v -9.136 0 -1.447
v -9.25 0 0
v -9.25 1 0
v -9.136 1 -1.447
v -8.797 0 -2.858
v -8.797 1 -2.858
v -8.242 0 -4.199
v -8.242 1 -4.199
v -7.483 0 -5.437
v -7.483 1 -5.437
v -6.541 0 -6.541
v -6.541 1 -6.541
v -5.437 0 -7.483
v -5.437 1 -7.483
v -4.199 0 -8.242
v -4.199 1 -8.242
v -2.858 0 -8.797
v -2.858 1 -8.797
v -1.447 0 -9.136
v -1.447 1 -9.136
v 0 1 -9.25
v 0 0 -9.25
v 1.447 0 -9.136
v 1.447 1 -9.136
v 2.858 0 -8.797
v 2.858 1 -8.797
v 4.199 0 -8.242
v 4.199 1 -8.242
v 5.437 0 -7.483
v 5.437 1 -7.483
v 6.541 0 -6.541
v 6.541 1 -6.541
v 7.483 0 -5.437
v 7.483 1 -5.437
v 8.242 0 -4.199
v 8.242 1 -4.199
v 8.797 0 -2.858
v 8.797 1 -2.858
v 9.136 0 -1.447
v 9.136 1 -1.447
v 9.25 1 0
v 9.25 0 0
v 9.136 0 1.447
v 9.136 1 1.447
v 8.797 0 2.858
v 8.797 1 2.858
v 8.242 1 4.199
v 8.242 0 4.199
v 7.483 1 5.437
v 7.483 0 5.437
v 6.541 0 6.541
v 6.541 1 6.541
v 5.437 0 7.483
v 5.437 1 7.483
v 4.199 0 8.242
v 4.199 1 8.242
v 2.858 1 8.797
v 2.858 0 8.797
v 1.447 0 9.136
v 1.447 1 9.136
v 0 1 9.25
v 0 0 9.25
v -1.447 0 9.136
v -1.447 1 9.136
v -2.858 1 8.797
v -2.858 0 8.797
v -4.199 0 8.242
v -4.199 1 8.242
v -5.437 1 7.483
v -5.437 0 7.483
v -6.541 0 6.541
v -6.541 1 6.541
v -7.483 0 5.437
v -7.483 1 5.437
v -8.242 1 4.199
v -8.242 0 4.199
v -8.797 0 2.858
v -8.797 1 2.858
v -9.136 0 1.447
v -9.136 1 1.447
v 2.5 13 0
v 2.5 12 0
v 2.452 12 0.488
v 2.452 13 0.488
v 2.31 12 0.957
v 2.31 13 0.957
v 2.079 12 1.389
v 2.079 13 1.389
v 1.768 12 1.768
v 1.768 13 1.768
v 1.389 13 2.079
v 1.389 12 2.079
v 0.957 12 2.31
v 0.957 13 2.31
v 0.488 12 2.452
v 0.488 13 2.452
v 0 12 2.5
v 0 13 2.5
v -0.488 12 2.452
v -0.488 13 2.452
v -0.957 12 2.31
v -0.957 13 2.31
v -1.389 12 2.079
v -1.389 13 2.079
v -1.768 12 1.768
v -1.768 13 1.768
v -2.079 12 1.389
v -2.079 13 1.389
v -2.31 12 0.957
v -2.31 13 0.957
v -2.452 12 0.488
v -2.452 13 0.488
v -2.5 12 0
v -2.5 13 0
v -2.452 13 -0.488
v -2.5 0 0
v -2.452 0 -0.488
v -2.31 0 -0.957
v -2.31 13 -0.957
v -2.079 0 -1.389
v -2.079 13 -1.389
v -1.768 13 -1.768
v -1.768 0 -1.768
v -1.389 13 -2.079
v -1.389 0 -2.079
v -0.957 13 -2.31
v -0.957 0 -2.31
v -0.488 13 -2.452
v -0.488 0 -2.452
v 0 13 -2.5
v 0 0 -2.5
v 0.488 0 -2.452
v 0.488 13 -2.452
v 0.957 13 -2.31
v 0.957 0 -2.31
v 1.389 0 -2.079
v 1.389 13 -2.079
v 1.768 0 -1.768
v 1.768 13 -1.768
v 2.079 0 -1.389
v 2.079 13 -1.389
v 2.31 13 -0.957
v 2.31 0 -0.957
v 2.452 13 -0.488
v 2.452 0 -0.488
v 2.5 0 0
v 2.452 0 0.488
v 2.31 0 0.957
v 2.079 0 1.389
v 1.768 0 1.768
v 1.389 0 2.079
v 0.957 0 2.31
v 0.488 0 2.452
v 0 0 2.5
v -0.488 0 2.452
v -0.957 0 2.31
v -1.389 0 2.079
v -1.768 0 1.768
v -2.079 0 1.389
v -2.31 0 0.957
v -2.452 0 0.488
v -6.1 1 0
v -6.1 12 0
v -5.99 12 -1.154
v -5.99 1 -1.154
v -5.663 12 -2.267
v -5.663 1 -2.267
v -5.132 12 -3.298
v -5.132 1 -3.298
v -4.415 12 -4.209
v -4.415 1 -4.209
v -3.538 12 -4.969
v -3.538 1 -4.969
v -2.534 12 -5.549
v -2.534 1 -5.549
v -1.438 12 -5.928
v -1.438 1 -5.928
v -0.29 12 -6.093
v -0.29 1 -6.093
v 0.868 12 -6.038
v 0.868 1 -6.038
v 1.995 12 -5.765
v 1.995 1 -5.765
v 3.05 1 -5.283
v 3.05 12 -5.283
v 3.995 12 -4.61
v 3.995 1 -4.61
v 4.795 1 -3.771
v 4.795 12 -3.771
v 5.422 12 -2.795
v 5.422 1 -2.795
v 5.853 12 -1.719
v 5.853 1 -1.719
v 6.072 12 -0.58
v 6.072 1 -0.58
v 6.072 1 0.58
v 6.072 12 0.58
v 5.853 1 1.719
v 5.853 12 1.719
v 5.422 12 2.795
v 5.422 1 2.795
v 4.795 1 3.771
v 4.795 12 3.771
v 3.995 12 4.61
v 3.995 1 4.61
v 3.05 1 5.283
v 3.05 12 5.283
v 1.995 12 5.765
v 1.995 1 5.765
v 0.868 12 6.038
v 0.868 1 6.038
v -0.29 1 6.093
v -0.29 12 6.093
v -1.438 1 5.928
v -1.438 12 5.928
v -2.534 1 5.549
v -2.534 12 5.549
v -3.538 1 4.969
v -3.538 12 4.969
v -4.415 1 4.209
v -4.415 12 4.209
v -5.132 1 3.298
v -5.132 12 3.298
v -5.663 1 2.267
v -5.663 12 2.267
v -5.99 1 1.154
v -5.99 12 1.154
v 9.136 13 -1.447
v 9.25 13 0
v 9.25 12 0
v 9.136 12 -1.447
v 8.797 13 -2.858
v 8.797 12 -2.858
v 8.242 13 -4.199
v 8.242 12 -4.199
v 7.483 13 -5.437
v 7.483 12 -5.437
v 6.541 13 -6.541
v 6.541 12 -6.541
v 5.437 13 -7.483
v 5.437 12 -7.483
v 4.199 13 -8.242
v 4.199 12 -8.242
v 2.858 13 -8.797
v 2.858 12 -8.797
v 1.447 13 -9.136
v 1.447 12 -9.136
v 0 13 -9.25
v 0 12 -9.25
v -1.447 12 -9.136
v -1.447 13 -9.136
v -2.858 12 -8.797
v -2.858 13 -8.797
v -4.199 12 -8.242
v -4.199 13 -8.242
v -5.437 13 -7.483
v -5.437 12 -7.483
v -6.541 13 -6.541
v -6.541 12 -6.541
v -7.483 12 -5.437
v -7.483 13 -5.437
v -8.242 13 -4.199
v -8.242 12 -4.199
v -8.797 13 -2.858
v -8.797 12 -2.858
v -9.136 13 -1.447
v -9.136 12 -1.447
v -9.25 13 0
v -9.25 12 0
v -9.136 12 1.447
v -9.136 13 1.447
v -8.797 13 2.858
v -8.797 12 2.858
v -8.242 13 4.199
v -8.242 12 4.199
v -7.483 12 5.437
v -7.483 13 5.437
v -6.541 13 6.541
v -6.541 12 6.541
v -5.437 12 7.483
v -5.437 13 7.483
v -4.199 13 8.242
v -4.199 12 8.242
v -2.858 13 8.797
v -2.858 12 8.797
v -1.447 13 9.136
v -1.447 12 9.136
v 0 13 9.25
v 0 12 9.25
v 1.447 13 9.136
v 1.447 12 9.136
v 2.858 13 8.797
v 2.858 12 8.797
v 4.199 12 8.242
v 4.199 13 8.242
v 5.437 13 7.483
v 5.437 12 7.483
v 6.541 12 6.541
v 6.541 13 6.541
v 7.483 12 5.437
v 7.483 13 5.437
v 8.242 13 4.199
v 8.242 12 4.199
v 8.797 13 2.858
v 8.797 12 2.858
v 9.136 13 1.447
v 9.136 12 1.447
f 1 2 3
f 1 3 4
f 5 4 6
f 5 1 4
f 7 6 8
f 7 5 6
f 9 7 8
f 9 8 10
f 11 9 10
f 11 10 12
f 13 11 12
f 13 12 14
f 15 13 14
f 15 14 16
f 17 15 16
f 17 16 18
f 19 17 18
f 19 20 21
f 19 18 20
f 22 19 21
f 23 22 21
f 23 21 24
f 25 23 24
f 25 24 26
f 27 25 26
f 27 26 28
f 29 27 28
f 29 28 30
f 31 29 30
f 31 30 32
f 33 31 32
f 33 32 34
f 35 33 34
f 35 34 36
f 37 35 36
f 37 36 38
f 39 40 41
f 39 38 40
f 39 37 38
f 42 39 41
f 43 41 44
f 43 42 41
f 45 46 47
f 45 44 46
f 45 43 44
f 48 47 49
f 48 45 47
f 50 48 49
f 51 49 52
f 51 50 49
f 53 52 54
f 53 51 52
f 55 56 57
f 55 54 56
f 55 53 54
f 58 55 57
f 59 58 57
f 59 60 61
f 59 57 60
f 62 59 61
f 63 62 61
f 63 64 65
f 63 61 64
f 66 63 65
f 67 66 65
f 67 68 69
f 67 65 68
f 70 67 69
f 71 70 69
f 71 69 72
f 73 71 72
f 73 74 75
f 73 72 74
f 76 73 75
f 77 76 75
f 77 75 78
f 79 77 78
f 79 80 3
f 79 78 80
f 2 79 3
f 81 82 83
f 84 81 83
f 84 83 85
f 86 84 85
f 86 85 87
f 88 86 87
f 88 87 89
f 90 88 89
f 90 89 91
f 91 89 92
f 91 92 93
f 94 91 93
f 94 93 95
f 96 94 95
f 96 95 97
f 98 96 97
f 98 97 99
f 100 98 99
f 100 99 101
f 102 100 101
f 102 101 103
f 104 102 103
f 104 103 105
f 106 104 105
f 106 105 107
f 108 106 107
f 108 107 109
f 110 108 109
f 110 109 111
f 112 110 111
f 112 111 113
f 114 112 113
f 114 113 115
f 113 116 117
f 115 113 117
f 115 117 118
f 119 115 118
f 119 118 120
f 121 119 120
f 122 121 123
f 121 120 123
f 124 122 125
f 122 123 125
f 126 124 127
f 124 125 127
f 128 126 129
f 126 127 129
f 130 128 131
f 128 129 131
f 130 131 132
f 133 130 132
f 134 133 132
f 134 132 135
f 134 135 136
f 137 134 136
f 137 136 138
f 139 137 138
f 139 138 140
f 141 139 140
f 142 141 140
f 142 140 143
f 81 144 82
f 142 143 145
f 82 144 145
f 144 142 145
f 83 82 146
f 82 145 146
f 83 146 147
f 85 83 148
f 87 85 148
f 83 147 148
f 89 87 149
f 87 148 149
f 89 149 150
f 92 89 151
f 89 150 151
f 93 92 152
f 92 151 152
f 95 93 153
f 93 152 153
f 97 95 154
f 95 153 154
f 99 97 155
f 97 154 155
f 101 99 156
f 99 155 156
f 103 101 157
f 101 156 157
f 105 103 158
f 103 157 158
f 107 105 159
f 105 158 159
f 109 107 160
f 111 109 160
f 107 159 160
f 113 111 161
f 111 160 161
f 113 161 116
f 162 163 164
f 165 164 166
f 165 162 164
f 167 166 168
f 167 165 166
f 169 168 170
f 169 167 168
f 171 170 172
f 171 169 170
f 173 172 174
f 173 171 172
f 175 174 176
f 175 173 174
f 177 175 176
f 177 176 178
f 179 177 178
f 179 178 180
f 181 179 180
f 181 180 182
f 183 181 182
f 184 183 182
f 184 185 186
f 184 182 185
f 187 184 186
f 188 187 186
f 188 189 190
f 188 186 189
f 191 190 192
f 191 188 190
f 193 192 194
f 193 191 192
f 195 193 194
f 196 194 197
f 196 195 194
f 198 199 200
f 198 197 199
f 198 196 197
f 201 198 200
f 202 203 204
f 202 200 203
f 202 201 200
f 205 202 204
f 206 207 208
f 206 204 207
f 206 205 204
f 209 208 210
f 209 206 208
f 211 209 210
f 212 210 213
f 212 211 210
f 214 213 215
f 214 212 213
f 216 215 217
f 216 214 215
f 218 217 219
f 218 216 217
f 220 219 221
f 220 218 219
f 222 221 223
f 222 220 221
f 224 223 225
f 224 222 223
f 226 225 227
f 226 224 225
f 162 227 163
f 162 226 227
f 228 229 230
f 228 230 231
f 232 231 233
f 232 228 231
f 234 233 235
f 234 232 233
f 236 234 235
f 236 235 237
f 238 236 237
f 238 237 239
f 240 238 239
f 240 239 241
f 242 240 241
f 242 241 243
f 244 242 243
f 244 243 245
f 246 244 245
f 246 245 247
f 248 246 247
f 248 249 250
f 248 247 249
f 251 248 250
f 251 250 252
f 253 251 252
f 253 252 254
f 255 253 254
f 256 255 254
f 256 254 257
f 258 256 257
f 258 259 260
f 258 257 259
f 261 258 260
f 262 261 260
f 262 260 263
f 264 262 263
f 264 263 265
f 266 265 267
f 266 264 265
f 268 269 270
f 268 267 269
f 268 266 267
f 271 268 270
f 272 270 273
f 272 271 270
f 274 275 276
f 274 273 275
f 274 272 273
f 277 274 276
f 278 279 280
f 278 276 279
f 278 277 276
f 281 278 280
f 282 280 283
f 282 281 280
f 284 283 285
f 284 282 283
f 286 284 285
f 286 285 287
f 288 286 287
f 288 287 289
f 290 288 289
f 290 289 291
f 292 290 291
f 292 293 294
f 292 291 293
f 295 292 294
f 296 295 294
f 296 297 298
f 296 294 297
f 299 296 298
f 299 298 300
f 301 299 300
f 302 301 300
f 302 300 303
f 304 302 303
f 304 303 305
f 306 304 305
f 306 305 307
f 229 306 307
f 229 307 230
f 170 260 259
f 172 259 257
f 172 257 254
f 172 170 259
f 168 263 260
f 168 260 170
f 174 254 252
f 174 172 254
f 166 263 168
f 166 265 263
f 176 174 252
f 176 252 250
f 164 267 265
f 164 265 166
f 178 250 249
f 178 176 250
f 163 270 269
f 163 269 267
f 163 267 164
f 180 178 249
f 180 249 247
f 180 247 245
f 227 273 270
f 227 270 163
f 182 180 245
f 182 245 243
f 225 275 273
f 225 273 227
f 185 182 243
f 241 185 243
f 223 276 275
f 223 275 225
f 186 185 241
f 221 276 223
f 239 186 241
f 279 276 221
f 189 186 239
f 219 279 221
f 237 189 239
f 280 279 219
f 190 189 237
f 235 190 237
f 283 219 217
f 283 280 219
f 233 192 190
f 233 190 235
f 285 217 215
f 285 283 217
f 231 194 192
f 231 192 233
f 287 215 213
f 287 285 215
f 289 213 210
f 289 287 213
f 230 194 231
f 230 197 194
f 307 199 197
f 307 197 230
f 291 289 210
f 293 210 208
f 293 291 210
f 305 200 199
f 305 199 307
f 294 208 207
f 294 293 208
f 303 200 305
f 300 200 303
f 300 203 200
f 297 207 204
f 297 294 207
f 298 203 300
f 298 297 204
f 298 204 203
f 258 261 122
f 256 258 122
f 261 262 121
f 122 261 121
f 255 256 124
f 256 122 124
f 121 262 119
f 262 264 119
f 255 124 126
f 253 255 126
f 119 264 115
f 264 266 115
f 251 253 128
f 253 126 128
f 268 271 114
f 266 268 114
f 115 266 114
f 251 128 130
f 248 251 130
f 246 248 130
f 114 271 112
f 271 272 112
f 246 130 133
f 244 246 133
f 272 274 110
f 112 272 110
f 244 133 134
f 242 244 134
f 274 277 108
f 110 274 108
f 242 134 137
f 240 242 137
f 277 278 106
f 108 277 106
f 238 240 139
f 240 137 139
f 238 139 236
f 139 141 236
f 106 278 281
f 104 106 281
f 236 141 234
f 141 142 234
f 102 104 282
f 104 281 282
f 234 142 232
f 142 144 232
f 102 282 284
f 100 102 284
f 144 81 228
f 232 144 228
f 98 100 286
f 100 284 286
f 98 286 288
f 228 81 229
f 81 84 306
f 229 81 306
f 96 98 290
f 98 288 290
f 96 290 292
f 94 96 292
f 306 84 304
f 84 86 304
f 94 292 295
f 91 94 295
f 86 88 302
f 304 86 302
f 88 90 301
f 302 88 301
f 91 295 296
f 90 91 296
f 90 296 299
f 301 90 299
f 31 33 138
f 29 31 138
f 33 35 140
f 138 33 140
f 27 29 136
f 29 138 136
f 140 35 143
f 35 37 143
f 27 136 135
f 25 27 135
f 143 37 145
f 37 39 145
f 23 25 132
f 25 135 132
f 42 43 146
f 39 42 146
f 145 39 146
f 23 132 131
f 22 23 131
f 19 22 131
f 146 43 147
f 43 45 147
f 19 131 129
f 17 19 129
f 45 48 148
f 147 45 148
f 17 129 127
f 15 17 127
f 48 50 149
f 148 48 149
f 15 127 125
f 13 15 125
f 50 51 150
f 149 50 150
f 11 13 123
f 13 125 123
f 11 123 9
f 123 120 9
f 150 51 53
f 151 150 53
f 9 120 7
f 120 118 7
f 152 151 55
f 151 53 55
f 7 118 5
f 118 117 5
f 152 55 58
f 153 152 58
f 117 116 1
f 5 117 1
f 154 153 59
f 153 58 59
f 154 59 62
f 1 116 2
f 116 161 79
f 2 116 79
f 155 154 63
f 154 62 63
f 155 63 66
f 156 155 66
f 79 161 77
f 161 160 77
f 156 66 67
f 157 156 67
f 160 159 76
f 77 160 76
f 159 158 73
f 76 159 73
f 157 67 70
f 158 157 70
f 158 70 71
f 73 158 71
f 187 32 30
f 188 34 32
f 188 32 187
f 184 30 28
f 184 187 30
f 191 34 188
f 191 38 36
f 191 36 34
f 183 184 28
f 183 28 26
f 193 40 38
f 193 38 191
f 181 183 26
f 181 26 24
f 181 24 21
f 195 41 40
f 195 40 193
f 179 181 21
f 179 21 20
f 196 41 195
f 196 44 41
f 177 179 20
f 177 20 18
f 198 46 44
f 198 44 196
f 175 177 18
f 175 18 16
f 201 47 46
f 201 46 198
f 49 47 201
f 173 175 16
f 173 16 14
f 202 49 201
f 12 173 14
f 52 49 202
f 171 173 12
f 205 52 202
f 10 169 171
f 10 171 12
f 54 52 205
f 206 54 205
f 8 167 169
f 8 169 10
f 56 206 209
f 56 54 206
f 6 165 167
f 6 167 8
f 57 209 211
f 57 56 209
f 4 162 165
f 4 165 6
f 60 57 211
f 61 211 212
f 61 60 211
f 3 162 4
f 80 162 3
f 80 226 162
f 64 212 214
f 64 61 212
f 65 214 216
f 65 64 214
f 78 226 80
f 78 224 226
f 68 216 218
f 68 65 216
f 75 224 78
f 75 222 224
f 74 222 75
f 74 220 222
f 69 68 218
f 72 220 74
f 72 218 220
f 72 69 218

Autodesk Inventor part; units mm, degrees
ref_plane "YZ Plane" through (0, 0, 0) normal (1, 0, 0) x (0, 1, 0)
ref_plane "XZ Plane" through (0, 0, 0) normal (0, 1, 0) x (-1, 0, 0)
ref_plane "XY Plane" through (0, 0, 0) normal (0, 0, 1) x (1, 0, 0)
sketch "Sketch1" plane through (0, 0, 0) normal (0, 1, 0) x (-1, 0, 0)
  circle A0 centre (0, 0) radius 9.25
  circle A1 centre (0, 0) radius 2.5
  circle A2 centre (0, 0) radius 6.1
  dimension "d0" = 18.5
  dimension "d1" = 5
  dimension "d4" = 12.2
extrude "Extrusion1" add sketch "Sketch1" along normal blind 1 contours A0 | A2
ref_plane "Work Plane1" through (0, 13, 0) normal (0, -1, 0) x (1, 0, 0)
sketch "Sketch2" plane through (0, 13, 0) normal (0, -1, 0) x (1, 0, 0)
  circle A0 centre (0, 0) radius 9.25 projected
  circle A1 centre (0, 0) radius 2.5 projected
extrude "Extrusion2" add sketch "Sketch2" along normal blind 1
extrude "Extrusion3" add sketch "Sketch1" along normal up to surface (12 mm away) contours A2
properties part number "Idler Pulley 10mm 5mm Bore" material "Aluminum 6061"
